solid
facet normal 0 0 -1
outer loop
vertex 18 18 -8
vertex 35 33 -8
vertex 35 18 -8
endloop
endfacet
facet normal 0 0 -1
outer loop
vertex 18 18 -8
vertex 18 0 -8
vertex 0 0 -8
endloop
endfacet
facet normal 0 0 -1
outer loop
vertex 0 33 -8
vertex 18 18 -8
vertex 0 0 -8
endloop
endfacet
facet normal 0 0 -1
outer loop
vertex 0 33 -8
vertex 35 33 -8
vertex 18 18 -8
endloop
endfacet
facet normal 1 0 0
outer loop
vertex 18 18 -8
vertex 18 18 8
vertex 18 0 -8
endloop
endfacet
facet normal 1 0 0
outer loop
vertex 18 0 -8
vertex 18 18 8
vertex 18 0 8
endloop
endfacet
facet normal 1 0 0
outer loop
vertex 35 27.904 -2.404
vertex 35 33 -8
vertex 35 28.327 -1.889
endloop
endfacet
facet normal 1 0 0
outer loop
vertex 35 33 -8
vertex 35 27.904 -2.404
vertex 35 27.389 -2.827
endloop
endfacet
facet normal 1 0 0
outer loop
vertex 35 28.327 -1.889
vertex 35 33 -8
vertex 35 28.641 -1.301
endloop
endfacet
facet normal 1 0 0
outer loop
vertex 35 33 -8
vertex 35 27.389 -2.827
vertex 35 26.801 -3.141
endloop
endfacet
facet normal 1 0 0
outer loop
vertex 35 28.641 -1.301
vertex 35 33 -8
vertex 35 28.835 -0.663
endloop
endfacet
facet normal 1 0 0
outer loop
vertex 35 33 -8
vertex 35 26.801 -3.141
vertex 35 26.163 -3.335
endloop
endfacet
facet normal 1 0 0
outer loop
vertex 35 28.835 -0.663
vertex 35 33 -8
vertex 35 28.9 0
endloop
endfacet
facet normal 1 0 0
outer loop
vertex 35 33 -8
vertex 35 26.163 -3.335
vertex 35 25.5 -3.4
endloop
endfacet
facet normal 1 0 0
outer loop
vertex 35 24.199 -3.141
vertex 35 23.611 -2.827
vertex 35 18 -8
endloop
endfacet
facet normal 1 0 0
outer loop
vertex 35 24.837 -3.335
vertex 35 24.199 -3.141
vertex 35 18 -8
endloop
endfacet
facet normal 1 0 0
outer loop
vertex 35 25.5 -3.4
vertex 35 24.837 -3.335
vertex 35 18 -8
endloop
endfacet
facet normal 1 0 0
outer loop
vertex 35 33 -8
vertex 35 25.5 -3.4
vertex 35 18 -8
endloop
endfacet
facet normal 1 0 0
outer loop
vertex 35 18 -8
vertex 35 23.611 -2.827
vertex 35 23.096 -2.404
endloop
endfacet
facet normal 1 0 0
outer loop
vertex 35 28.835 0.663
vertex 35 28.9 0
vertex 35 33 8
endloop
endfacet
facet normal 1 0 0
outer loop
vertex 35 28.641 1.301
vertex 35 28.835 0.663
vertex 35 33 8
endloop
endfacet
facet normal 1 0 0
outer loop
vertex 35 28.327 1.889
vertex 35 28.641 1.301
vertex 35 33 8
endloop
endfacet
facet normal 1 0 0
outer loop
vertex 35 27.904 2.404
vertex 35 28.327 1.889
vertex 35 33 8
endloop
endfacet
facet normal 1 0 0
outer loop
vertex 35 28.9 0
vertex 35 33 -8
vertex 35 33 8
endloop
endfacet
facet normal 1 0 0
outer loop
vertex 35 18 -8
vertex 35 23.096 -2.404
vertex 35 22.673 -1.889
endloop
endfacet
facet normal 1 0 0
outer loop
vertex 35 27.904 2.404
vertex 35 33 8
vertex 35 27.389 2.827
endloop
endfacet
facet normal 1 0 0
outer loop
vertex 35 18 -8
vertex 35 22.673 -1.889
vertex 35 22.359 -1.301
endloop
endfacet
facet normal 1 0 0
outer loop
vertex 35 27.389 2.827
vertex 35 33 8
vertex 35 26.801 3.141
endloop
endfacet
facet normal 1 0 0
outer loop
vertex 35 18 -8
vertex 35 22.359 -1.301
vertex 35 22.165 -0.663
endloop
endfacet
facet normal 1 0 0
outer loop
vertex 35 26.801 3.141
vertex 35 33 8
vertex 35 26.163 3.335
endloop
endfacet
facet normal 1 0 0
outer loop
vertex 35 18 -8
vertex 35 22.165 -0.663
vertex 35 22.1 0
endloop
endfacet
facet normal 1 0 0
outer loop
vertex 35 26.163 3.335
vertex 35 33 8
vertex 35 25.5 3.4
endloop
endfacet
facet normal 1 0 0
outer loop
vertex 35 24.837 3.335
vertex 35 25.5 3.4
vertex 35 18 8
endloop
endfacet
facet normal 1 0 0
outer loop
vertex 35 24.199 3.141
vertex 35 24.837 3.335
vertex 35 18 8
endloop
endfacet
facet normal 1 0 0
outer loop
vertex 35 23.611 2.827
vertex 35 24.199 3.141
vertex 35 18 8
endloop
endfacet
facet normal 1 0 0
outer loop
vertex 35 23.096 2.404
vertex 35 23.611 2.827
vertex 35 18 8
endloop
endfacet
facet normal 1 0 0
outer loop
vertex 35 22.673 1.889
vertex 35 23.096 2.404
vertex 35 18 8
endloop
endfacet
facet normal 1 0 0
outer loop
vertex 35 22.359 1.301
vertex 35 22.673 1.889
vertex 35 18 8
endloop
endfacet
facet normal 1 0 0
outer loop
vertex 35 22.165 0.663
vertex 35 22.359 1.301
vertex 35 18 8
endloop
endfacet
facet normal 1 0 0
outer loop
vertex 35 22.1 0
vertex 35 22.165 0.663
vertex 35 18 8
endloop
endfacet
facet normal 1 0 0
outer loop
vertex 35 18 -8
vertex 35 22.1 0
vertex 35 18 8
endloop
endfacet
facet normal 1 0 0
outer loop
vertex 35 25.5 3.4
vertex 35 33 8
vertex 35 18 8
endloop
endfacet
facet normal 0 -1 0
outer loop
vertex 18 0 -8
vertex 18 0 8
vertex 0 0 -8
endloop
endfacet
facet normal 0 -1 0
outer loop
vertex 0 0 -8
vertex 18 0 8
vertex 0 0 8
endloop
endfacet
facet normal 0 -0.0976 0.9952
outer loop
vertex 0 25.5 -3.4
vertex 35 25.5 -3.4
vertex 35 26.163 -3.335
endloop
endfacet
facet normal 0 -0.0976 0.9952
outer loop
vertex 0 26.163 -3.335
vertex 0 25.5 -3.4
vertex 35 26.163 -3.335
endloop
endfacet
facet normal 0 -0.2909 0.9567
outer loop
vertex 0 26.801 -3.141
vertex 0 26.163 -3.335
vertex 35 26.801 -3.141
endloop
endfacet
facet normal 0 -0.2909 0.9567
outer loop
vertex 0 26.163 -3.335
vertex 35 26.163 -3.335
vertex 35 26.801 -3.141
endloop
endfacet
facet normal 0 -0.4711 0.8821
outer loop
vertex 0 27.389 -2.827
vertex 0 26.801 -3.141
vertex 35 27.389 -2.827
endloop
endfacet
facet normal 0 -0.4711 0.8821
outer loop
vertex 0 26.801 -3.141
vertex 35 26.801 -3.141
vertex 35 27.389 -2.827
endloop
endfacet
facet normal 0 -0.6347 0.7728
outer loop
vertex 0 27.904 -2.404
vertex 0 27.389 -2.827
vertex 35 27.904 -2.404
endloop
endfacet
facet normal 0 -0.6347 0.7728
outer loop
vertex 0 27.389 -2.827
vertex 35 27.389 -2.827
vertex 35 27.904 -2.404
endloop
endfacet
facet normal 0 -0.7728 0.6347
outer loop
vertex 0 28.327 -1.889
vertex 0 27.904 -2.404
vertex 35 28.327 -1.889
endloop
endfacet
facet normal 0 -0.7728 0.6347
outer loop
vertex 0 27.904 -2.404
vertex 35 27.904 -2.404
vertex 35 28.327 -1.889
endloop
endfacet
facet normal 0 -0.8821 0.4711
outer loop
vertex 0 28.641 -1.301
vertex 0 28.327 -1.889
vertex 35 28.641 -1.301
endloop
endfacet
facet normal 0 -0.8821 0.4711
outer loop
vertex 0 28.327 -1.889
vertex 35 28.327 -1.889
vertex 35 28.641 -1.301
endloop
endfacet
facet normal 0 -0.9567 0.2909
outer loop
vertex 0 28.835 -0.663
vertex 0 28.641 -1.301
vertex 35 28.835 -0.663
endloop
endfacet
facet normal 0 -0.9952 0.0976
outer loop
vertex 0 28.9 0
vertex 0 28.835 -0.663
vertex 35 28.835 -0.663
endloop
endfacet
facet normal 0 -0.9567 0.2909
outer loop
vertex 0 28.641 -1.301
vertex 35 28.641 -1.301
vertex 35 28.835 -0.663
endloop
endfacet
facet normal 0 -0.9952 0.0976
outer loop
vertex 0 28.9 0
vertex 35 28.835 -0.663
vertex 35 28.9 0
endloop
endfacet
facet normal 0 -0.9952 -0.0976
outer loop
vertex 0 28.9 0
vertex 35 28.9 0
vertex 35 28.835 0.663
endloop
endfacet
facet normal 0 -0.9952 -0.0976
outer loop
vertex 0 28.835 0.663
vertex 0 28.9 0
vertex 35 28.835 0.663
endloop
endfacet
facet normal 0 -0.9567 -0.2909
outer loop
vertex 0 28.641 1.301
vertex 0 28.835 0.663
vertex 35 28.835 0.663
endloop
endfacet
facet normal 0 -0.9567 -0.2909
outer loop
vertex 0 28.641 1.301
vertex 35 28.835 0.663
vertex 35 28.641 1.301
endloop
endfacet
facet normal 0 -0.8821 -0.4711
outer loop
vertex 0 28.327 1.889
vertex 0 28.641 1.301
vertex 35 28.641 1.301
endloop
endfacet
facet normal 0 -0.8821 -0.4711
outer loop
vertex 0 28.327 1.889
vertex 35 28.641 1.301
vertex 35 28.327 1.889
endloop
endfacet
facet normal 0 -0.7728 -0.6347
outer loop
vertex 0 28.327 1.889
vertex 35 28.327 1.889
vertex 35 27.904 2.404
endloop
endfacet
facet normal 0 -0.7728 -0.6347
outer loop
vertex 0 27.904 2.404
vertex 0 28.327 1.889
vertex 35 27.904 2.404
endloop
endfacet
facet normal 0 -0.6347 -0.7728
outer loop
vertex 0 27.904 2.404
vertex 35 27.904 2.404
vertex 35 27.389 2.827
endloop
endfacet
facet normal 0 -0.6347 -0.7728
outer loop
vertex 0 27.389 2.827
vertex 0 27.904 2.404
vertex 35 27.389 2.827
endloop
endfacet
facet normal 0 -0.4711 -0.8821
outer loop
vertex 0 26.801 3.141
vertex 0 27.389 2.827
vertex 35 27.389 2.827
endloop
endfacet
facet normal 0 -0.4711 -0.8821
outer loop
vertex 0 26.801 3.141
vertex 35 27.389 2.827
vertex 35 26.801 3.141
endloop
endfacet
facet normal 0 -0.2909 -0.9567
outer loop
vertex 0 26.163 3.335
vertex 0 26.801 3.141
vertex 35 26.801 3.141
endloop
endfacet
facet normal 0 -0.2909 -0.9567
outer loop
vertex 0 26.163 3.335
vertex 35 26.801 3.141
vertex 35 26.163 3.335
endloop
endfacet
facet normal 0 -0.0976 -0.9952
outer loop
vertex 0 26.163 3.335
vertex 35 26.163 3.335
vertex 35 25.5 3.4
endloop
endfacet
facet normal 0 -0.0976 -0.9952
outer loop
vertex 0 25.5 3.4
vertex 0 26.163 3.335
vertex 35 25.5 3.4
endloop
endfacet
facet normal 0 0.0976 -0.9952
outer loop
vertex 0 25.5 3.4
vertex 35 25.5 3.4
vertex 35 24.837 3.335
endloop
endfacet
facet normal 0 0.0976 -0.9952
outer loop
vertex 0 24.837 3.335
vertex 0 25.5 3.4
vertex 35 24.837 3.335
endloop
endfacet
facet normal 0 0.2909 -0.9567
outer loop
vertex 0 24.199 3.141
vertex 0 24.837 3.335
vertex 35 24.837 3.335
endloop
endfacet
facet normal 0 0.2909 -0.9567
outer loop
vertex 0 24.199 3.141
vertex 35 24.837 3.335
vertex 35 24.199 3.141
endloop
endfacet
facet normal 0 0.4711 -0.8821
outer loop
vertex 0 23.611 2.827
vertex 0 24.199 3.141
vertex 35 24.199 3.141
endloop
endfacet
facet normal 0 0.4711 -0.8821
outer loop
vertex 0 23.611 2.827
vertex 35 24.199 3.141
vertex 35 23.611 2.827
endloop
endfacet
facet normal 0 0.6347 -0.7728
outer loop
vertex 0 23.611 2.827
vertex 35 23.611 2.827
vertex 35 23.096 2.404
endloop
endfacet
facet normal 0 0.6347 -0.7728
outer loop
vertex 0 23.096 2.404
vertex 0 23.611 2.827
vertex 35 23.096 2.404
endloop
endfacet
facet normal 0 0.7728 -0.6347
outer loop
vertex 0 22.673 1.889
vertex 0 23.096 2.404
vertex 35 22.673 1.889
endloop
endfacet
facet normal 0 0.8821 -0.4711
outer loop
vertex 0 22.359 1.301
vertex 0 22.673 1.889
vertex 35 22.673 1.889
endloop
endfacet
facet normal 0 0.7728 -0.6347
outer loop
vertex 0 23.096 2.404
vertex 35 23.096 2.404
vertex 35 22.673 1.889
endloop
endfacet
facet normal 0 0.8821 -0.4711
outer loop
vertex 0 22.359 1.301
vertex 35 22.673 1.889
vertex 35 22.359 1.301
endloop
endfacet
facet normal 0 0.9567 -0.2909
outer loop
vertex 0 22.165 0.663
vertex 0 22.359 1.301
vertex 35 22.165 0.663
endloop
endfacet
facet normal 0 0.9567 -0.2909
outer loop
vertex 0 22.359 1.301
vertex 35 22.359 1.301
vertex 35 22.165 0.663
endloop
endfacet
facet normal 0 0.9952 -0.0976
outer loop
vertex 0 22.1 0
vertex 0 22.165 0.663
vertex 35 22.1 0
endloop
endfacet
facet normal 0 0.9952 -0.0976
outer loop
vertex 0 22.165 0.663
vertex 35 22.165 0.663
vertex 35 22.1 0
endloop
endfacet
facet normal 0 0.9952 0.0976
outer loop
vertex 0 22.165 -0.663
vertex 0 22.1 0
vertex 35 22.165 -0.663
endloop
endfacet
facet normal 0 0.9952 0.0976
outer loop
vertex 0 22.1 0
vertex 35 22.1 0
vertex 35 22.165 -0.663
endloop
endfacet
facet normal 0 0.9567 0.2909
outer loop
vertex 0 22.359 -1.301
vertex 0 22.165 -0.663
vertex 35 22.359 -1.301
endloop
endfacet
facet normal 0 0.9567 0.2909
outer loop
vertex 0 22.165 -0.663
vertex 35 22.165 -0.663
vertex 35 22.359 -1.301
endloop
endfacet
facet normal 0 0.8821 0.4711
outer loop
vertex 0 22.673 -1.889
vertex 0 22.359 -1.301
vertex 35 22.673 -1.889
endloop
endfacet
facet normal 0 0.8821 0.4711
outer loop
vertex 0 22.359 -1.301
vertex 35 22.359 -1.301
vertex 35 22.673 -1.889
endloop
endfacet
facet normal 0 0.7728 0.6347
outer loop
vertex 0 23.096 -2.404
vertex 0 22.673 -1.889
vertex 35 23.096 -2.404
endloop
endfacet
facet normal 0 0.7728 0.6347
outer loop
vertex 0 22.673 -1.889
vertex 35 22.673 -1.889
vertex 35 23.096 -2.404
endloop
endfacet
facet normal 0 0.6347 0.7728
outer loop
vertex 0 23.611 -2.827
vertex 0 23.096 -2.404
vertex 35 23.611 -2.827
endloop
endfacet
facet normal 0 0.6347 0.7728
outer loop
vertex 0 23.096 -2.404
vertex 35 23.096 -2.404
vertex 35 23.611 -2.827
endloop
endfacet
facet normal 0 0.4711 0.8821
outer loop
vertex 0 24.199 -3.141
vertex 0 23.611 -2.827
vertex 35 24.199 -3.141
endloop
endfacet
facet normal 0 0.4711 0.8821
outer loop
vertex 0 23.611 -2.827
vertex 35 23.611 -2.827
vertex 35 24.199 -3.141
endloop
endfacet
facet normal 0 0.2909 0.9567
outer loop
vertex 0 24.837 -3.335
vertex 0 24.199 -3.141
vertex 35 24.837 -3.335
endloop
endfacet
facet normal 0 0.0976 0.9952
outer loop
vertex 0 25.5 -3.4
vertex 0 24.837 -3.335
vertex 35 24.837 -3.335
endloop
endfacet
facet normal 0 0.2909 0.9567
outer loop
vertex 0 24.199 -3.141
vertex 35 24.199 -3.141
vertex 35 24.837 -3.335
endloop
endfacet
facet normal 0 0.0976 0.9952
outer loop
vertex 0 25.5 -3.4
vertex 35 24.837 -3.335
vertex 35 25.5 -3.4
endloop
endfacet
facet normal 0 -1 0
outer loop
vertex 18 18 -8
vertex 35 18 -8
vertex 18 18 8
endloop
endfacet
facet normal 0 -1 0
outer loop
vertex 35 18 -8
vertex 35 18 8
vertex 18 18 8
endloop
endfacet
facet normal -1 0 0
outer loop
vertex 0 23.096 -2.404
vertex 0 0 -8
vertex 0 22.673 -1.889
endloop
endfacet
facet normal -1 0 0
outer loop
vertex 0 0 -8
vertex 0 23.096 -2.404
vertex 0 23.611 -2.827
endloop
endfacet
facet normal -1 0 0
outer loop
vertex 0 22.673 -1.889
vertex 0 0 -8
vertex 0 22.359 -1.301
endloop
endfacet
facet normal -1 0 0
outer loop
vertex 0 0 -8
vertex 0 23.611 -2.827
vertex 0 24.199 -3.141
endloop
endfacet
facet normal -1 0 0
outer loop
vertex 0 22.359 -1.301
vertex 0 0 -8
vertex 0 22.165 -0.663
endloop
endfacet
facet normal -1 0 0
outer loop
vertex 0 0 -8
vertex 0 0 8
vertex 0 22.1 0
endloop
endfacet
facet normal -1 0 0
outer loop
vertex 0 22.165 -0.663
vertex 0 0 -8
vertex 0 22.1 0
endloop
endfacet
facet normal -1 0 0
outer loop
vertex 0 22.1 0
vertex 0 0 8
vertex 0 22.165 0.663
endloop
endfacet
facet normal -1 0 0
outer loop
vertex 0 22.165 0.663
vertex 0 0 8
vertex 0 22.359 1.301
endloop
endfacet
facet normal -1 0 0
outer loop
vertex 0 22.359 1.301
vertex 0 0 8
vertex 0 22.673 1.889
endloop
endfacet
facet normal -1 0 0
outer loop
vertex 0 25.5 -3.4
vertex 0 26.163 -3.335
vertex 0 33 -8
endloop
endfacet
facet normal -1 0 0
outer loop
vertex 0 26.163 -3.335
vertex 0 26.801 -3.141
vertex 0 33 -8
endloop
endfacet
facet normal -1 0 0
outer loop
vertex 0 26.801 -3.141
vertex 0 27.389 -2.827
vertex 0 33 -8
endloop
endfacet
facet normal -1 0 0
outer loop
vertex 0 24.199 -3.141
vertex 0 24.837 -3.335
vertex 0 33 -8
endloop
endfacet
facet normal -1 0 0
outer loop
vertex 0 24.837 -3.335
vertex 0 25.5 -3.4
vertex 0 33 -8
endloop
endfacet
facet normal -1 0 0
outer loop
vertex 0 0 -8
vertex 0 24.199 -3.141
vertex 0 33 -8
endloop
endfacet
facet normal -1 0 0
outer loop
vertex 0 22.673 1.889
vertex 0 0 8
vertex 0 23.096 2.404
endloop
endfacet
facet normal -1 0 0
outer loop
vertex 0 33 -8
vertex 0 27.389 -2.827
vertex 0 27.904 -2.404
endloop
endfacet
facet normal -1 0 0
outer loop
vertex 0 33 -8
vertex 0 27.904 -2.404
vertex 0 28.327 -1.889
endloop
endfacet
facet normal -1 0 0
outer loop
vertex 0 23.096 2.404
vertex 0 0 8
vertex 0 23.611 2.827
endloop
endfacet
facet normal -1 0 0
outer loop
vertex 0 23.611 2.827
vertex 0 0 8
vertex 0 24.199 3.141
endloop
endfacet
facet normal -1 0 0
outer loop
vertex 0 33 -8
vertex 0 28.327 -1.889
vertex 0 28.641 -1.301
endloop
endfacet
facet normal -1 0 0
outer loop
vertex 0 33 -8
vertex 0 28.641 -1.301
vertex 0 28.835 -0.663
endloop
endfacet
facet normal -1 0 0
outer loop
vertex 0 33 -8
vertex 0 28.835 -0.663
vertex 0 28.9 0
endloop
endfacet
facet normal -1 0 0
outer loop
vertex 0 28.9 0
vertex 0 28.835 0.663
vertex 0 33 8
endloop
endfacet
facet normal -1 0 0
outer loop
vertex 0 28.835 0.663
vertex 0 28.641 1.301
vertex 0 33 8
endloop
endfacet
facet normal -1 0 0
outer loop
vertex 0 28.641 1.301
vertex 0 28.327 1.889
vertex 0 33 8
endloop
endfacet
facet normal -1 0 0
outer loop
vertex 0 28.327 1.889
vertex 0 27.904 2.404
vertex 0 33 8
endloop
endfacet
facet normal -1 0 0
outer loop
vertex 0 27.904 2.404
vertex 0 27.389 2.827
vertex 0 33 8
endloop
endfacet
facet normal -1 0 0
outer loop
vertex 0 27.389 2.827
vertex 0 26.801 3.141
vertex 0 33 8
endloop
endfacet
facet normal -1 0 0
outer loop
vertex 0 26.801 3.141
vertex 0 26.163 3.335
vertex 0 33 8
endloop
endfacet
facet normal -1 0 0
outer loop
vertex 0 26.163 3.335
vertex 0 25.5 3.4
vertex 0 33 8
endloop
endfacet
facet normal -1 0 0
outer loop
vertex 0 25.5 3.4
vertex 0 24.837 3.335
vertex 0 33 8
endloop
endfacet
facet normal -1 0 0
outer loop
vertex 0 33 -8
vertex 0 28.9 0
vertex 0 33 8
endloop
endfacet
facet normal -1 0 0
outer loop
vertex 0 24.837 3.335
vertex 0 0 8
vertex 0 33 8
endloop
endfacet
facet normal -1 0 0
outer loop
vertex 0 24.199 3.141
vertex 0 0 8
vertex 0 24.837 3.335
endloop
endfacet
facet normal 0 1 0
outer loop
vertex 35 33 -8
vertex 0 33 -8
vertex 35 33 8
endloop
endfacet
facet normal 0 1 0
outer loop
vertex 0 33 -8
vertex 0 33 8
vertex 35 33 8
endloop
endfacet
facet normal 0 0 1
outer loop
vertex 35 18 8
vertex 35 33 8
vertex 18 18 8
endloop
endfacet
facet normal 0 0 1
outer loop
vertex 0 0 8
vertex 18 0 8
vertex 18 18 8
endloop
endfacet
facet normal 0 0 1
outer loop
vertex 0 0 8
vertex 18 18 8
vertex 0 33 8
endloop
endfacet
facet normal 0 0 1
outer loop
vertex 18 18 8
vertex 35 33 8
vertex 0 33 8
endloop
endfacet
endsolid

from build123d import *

# Parameters (mm, degrees)
EXTRUDE_1_DEPTH    = 8
HOLE_WIZARD_M8_1_D = 6.8


with BuildPart() as part:
    # 스케치1 → 보스-돌출1 (new body, symmetric)
    with BuildSketch(Plane.XY):
        Polygon((0, 0), (0, 33), (35, 33), (35, 18), (18, 18), (18, 0), align=None)
    extrude(amount=EXTRUDE_1_DEPTH, both=True)

    # M8 나사 구멍1 (through all)
    with Locations(Plane.ZY):
        with Locations((0, 25.5)):
            Hole(HOLE_WIZARD_M8_1_D / 2)


solid = part.part
